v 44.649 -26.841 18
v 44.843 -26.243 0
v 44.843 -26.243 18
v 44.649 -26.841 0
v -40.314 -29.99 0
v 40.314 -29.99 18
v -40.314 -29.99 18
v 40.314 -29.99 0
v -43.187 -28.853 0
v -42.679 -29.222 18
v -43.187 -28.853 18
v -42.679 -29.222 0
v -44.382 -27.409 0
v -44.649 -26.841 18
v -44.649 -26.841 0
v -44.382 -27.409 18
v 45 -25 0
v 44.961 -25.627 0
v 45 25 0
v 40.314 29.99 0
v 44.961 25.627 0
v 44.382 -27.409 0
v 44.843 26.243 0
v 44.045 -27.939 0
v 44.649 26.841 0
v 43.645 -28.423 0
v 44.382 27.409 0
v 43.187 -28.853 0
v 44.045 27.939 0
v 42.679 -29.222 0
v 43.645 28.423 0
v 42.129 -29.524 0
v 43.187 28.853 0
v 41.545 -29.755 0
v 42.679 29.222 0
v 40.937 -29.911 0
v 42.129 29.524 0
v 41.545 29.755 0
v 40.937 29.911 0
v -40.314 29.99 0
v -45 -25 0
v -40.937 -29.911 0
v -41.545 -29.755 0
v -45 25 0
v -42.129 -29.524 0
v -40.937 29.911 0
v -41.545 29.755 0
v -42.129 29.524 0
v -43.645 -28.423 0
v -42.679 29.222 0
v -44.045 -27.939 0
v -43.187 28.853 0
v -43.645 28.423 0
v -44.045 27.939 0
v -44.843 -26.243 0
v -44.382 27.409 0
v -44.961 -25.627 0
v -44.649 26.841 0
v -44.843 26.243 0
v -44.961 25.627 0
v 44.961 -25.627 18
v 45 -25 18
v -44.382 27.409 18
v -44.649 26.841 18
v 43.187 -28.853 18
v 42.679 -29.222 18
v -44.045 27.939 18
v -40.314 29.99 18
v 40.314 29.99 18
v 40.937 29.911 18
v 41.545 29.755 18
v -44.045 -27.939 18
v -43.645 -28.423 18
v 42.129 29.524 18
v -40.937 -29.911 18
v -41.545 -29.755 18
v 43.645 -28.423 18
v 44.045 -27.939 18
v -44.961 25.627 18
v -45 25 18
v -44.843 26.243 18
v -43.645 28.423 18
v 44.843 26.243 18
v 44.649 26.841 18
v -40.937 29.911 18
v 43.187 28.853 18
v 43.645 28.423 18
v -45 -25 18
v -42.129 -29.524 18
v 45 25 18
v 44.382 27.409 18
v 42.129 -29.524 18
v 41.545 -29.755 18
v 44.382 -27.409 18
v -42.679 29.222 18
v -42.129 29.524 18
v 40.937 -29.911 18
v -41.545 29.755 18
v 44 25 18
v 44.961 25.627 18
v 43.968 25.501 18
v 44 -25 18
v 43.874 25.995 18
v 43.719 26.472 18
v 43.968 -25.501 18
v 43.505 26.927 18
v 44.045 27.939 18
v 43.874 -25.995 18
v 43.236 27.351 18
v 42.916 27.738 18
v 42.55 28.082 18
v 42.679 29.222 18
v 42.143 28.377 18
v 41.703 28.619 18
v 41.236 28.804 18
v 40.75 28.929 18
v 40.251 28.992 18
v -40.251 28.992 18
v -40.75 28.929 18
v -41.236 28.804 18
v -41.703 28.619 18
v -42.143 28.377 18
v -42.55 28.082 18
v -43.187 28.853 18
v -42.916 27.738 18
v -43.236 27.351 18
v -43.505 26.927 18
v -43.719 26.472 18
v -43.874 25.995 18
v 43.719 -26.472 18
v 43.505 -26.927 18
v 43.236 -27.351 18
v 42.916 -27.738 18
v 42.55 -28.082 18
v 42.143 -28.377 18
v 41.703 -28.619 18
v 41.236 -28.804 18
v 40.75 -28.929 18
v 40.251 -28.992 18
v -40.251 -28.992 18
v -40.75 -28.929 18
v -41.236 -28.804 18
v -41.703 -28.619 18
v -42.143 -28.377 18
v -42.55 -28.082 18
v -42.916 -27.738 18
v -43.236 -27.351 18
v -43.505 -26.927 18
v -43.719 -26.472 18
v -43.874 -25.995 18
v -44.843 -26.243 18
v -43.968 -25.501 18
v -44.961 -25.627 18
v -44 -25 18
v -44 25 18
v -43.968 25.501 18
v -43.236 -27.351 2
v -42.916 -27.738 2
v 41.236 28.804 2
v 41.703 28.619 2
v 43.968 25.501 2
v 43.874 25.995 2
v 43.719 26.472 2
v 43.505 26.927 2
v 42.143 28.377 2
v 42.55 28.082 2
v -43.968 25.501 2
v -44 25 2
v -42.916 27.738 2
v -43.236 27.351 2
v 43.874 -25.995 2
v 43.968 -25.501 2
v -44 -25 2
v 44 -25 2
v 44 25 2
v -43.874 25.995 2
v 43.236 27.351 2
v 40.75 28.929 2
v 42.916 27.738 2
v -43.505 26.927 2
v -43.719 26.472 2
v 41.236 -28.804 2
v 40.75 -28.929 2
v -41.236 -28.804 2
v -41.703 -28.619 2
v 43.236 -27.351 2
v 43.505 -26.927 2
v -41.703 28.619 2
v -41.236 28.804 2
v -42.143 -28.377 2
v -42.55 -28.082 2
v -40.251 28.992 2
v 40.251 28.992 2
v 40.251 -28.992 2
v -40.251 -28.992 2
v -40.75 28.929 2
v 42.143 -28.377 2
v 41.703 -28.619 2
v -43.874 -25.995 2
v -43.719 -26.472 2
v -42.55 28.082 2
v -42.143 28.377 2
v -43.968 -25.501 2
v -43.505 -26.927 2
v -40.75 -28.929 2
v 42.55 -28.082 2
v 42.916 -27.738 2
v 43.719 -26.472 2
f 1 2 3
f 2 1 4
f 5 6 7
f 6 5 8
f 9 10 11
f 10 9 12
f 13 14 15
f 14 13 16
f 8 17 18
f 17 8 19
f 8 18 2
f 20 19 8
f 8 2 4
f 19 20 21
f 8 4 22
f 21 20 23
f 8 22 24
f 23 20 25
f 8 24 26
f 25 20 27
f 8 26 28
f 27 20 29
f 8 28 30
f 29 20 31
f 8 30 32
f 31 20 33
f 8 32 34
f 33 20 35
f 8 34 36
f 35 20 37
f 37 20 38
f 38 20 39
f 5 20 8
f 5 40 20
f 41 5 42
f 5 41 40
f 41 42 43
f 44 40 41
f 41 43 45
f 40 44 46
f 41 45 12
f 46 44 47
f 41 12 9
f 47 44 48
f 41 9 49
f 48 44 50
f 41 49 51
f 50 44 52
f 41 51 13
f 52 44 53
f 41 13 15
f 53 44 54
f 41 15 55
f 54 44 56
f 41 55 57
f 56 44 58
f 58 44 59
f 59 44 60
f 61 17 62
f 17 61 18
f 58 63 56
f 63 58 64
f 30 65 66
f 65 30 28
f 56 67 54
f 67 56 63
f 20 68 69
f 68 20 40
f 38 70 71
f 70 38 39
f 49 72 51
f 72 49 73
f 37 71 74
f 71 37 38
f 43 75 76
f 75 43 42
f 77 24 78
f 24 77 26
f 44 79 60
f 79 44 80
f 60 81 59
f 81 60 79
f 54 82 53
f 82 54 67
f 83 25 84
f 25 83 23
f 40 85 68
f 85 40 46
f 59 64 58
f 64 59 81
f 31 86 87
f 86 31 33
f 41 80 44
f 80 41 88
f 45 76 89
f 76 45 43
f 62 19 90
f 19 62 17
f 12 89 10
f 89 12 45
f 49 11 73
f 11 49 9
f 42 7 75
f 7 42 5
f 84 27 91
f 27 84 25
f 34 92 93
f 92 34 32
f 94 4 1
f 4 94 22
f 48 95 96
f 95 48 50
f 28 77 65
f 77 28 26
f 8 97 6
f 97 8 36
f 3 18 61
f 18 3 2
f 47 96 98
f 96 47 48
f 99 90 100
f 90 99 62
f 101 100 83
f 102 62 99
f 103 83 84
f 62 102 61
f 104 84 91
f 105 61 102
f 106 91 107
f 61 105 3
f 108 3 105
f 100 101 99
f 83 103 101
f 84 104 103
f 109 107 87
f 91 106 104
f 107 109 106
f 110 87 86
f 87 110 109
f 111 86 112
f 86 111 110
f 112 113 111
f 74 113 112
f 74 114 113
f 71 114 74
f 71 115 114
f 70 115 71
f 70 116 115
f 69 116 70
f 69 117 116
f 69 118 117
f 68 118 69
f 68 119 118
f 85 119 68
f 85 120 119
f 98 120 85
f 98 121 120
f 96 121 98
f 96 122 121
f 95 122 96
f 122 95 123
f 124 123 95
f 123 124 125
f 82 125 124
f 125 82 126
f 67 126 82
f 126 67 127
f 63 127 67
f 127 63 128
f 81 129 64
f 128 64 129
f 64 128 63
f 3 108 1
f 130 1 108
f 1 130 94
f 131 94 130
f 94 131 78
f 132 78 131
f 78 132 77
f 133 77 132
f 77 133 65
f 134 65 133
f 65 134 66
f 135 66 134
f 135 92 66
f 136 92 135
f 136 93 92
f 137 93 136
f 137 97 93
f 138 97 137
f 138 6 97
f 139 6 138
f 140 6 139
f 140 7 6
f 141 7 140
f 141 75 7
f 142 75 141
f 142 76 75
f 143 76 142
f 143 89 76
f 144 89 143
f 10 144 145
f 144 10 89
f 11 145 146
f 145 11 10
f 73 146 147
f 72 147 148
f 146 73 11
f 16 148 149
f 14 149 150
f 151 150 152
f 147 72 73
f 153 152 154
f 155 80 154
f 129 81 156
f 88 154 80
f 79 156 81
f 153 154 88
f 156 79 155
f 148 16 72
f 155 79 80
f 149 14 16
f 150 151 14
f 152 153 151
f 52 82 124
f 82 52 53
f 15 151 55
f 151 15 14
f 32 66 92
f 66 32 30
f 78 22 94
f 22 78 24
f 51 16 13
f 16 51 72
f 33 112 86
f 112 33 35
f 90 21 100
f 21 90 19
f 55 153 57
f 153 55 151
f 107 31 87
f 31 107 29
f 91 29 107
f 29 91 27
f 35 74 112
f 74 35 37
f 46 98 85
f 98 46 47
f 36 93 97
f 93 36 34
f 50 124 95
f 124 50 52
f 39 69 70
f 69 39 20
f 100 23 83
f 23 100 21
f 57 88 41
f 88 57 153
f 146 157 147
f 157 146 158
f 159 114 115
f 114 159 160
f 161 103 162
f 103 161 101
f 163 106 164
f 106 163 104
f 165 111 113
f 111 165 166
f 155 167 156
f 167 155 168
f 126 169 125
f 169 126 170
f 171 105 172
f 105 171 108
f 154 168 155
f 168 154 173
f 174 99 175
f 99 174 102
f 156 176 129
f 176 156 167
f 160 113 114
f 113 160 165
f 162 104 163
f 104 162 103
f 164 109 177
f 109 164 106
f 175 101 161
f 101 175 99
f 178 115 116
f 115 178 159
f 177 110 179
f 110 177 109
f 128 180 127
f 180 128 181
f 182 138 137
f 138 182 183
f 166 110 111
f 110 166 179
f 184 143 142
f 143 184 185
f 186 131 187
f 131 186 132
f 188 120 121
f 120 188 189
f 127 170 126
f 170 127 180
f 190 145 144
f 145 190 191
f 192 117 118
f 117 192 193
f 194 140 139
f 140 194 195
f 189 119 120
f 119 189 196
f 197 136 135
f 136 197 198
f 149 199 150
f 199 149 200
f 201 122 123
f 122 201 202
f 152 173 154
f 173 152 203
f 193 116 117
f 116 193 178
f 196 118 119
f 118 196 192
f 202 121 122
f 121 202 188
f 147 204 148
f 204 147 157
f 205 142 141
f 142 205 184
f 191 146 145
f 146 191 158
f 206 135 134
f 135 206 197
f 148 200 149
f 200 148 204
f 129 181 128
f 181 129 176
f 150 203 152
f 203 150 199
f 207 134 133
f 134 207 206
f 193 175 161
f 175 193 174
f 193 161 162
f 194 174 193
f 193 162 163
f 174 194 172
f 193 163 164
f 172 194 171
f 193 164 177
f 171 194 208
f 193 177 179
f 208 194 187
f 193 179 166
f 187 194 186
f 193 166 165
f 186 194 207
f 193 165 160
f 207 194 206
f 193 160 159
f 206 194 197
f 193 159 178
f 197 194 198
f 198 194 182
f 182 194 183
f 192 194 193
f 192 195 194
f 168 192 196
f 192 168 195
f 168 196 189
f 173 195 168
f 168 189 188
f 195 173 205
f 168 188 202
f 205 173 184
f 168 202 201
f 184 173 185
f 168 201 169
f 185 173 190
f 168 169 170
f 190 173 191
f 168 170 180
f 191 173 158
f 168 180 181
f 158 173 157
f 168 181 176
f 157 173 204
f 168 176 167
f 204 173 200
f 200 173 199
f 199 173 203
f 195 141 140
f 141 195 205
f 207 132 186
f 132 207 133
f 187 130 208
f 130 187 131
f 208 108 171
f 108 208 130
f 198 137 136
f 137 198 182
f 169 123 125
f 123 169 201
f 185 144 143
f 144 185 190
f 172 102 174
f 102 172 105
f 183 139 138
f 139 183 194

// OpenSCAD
$fn = 50;


difference() {
	union() {
		hull() {
			translate(v = [-40.0000000000, 25.0000000000, 0]) {
				cylinder(h = 18, r = 5);
			}
			translate(v = [40.0000000000, 25.0000000000, 0]) {
				cylinder(h = 18, r = 5);
			}
			translate(v = [-40.0000000000, -25.0000000000, 0]) {
				cylinder(h = 18, r = 5);
			}
			translate(v = [40.0000000000, -25.0000000000, 0]) {
				cylinder(h = 18, r = 5);
			}
		}
	}
	union() {
		translate(v = [0, 0, 2]) {
			hull() {
				translate(v = [-40.0000000000, 25.0000000000, 0]) {
					cylinder(h = 16, r = 4);
				}
				translate(v = [40.0000000000, 25.0000000000, 0]) {
					cylinder(h = 16, r = 4);
				}
				translate(v = [-40.0000000000, -25.0000000000, 0]) {
					cylinder(h = 16, r = 4);
				}
				translate(v = [40.0000000000, -25.0000000000, 0]) {
					cylinder(h = 16, r = 4);
				}
			}
		}
	}
}
